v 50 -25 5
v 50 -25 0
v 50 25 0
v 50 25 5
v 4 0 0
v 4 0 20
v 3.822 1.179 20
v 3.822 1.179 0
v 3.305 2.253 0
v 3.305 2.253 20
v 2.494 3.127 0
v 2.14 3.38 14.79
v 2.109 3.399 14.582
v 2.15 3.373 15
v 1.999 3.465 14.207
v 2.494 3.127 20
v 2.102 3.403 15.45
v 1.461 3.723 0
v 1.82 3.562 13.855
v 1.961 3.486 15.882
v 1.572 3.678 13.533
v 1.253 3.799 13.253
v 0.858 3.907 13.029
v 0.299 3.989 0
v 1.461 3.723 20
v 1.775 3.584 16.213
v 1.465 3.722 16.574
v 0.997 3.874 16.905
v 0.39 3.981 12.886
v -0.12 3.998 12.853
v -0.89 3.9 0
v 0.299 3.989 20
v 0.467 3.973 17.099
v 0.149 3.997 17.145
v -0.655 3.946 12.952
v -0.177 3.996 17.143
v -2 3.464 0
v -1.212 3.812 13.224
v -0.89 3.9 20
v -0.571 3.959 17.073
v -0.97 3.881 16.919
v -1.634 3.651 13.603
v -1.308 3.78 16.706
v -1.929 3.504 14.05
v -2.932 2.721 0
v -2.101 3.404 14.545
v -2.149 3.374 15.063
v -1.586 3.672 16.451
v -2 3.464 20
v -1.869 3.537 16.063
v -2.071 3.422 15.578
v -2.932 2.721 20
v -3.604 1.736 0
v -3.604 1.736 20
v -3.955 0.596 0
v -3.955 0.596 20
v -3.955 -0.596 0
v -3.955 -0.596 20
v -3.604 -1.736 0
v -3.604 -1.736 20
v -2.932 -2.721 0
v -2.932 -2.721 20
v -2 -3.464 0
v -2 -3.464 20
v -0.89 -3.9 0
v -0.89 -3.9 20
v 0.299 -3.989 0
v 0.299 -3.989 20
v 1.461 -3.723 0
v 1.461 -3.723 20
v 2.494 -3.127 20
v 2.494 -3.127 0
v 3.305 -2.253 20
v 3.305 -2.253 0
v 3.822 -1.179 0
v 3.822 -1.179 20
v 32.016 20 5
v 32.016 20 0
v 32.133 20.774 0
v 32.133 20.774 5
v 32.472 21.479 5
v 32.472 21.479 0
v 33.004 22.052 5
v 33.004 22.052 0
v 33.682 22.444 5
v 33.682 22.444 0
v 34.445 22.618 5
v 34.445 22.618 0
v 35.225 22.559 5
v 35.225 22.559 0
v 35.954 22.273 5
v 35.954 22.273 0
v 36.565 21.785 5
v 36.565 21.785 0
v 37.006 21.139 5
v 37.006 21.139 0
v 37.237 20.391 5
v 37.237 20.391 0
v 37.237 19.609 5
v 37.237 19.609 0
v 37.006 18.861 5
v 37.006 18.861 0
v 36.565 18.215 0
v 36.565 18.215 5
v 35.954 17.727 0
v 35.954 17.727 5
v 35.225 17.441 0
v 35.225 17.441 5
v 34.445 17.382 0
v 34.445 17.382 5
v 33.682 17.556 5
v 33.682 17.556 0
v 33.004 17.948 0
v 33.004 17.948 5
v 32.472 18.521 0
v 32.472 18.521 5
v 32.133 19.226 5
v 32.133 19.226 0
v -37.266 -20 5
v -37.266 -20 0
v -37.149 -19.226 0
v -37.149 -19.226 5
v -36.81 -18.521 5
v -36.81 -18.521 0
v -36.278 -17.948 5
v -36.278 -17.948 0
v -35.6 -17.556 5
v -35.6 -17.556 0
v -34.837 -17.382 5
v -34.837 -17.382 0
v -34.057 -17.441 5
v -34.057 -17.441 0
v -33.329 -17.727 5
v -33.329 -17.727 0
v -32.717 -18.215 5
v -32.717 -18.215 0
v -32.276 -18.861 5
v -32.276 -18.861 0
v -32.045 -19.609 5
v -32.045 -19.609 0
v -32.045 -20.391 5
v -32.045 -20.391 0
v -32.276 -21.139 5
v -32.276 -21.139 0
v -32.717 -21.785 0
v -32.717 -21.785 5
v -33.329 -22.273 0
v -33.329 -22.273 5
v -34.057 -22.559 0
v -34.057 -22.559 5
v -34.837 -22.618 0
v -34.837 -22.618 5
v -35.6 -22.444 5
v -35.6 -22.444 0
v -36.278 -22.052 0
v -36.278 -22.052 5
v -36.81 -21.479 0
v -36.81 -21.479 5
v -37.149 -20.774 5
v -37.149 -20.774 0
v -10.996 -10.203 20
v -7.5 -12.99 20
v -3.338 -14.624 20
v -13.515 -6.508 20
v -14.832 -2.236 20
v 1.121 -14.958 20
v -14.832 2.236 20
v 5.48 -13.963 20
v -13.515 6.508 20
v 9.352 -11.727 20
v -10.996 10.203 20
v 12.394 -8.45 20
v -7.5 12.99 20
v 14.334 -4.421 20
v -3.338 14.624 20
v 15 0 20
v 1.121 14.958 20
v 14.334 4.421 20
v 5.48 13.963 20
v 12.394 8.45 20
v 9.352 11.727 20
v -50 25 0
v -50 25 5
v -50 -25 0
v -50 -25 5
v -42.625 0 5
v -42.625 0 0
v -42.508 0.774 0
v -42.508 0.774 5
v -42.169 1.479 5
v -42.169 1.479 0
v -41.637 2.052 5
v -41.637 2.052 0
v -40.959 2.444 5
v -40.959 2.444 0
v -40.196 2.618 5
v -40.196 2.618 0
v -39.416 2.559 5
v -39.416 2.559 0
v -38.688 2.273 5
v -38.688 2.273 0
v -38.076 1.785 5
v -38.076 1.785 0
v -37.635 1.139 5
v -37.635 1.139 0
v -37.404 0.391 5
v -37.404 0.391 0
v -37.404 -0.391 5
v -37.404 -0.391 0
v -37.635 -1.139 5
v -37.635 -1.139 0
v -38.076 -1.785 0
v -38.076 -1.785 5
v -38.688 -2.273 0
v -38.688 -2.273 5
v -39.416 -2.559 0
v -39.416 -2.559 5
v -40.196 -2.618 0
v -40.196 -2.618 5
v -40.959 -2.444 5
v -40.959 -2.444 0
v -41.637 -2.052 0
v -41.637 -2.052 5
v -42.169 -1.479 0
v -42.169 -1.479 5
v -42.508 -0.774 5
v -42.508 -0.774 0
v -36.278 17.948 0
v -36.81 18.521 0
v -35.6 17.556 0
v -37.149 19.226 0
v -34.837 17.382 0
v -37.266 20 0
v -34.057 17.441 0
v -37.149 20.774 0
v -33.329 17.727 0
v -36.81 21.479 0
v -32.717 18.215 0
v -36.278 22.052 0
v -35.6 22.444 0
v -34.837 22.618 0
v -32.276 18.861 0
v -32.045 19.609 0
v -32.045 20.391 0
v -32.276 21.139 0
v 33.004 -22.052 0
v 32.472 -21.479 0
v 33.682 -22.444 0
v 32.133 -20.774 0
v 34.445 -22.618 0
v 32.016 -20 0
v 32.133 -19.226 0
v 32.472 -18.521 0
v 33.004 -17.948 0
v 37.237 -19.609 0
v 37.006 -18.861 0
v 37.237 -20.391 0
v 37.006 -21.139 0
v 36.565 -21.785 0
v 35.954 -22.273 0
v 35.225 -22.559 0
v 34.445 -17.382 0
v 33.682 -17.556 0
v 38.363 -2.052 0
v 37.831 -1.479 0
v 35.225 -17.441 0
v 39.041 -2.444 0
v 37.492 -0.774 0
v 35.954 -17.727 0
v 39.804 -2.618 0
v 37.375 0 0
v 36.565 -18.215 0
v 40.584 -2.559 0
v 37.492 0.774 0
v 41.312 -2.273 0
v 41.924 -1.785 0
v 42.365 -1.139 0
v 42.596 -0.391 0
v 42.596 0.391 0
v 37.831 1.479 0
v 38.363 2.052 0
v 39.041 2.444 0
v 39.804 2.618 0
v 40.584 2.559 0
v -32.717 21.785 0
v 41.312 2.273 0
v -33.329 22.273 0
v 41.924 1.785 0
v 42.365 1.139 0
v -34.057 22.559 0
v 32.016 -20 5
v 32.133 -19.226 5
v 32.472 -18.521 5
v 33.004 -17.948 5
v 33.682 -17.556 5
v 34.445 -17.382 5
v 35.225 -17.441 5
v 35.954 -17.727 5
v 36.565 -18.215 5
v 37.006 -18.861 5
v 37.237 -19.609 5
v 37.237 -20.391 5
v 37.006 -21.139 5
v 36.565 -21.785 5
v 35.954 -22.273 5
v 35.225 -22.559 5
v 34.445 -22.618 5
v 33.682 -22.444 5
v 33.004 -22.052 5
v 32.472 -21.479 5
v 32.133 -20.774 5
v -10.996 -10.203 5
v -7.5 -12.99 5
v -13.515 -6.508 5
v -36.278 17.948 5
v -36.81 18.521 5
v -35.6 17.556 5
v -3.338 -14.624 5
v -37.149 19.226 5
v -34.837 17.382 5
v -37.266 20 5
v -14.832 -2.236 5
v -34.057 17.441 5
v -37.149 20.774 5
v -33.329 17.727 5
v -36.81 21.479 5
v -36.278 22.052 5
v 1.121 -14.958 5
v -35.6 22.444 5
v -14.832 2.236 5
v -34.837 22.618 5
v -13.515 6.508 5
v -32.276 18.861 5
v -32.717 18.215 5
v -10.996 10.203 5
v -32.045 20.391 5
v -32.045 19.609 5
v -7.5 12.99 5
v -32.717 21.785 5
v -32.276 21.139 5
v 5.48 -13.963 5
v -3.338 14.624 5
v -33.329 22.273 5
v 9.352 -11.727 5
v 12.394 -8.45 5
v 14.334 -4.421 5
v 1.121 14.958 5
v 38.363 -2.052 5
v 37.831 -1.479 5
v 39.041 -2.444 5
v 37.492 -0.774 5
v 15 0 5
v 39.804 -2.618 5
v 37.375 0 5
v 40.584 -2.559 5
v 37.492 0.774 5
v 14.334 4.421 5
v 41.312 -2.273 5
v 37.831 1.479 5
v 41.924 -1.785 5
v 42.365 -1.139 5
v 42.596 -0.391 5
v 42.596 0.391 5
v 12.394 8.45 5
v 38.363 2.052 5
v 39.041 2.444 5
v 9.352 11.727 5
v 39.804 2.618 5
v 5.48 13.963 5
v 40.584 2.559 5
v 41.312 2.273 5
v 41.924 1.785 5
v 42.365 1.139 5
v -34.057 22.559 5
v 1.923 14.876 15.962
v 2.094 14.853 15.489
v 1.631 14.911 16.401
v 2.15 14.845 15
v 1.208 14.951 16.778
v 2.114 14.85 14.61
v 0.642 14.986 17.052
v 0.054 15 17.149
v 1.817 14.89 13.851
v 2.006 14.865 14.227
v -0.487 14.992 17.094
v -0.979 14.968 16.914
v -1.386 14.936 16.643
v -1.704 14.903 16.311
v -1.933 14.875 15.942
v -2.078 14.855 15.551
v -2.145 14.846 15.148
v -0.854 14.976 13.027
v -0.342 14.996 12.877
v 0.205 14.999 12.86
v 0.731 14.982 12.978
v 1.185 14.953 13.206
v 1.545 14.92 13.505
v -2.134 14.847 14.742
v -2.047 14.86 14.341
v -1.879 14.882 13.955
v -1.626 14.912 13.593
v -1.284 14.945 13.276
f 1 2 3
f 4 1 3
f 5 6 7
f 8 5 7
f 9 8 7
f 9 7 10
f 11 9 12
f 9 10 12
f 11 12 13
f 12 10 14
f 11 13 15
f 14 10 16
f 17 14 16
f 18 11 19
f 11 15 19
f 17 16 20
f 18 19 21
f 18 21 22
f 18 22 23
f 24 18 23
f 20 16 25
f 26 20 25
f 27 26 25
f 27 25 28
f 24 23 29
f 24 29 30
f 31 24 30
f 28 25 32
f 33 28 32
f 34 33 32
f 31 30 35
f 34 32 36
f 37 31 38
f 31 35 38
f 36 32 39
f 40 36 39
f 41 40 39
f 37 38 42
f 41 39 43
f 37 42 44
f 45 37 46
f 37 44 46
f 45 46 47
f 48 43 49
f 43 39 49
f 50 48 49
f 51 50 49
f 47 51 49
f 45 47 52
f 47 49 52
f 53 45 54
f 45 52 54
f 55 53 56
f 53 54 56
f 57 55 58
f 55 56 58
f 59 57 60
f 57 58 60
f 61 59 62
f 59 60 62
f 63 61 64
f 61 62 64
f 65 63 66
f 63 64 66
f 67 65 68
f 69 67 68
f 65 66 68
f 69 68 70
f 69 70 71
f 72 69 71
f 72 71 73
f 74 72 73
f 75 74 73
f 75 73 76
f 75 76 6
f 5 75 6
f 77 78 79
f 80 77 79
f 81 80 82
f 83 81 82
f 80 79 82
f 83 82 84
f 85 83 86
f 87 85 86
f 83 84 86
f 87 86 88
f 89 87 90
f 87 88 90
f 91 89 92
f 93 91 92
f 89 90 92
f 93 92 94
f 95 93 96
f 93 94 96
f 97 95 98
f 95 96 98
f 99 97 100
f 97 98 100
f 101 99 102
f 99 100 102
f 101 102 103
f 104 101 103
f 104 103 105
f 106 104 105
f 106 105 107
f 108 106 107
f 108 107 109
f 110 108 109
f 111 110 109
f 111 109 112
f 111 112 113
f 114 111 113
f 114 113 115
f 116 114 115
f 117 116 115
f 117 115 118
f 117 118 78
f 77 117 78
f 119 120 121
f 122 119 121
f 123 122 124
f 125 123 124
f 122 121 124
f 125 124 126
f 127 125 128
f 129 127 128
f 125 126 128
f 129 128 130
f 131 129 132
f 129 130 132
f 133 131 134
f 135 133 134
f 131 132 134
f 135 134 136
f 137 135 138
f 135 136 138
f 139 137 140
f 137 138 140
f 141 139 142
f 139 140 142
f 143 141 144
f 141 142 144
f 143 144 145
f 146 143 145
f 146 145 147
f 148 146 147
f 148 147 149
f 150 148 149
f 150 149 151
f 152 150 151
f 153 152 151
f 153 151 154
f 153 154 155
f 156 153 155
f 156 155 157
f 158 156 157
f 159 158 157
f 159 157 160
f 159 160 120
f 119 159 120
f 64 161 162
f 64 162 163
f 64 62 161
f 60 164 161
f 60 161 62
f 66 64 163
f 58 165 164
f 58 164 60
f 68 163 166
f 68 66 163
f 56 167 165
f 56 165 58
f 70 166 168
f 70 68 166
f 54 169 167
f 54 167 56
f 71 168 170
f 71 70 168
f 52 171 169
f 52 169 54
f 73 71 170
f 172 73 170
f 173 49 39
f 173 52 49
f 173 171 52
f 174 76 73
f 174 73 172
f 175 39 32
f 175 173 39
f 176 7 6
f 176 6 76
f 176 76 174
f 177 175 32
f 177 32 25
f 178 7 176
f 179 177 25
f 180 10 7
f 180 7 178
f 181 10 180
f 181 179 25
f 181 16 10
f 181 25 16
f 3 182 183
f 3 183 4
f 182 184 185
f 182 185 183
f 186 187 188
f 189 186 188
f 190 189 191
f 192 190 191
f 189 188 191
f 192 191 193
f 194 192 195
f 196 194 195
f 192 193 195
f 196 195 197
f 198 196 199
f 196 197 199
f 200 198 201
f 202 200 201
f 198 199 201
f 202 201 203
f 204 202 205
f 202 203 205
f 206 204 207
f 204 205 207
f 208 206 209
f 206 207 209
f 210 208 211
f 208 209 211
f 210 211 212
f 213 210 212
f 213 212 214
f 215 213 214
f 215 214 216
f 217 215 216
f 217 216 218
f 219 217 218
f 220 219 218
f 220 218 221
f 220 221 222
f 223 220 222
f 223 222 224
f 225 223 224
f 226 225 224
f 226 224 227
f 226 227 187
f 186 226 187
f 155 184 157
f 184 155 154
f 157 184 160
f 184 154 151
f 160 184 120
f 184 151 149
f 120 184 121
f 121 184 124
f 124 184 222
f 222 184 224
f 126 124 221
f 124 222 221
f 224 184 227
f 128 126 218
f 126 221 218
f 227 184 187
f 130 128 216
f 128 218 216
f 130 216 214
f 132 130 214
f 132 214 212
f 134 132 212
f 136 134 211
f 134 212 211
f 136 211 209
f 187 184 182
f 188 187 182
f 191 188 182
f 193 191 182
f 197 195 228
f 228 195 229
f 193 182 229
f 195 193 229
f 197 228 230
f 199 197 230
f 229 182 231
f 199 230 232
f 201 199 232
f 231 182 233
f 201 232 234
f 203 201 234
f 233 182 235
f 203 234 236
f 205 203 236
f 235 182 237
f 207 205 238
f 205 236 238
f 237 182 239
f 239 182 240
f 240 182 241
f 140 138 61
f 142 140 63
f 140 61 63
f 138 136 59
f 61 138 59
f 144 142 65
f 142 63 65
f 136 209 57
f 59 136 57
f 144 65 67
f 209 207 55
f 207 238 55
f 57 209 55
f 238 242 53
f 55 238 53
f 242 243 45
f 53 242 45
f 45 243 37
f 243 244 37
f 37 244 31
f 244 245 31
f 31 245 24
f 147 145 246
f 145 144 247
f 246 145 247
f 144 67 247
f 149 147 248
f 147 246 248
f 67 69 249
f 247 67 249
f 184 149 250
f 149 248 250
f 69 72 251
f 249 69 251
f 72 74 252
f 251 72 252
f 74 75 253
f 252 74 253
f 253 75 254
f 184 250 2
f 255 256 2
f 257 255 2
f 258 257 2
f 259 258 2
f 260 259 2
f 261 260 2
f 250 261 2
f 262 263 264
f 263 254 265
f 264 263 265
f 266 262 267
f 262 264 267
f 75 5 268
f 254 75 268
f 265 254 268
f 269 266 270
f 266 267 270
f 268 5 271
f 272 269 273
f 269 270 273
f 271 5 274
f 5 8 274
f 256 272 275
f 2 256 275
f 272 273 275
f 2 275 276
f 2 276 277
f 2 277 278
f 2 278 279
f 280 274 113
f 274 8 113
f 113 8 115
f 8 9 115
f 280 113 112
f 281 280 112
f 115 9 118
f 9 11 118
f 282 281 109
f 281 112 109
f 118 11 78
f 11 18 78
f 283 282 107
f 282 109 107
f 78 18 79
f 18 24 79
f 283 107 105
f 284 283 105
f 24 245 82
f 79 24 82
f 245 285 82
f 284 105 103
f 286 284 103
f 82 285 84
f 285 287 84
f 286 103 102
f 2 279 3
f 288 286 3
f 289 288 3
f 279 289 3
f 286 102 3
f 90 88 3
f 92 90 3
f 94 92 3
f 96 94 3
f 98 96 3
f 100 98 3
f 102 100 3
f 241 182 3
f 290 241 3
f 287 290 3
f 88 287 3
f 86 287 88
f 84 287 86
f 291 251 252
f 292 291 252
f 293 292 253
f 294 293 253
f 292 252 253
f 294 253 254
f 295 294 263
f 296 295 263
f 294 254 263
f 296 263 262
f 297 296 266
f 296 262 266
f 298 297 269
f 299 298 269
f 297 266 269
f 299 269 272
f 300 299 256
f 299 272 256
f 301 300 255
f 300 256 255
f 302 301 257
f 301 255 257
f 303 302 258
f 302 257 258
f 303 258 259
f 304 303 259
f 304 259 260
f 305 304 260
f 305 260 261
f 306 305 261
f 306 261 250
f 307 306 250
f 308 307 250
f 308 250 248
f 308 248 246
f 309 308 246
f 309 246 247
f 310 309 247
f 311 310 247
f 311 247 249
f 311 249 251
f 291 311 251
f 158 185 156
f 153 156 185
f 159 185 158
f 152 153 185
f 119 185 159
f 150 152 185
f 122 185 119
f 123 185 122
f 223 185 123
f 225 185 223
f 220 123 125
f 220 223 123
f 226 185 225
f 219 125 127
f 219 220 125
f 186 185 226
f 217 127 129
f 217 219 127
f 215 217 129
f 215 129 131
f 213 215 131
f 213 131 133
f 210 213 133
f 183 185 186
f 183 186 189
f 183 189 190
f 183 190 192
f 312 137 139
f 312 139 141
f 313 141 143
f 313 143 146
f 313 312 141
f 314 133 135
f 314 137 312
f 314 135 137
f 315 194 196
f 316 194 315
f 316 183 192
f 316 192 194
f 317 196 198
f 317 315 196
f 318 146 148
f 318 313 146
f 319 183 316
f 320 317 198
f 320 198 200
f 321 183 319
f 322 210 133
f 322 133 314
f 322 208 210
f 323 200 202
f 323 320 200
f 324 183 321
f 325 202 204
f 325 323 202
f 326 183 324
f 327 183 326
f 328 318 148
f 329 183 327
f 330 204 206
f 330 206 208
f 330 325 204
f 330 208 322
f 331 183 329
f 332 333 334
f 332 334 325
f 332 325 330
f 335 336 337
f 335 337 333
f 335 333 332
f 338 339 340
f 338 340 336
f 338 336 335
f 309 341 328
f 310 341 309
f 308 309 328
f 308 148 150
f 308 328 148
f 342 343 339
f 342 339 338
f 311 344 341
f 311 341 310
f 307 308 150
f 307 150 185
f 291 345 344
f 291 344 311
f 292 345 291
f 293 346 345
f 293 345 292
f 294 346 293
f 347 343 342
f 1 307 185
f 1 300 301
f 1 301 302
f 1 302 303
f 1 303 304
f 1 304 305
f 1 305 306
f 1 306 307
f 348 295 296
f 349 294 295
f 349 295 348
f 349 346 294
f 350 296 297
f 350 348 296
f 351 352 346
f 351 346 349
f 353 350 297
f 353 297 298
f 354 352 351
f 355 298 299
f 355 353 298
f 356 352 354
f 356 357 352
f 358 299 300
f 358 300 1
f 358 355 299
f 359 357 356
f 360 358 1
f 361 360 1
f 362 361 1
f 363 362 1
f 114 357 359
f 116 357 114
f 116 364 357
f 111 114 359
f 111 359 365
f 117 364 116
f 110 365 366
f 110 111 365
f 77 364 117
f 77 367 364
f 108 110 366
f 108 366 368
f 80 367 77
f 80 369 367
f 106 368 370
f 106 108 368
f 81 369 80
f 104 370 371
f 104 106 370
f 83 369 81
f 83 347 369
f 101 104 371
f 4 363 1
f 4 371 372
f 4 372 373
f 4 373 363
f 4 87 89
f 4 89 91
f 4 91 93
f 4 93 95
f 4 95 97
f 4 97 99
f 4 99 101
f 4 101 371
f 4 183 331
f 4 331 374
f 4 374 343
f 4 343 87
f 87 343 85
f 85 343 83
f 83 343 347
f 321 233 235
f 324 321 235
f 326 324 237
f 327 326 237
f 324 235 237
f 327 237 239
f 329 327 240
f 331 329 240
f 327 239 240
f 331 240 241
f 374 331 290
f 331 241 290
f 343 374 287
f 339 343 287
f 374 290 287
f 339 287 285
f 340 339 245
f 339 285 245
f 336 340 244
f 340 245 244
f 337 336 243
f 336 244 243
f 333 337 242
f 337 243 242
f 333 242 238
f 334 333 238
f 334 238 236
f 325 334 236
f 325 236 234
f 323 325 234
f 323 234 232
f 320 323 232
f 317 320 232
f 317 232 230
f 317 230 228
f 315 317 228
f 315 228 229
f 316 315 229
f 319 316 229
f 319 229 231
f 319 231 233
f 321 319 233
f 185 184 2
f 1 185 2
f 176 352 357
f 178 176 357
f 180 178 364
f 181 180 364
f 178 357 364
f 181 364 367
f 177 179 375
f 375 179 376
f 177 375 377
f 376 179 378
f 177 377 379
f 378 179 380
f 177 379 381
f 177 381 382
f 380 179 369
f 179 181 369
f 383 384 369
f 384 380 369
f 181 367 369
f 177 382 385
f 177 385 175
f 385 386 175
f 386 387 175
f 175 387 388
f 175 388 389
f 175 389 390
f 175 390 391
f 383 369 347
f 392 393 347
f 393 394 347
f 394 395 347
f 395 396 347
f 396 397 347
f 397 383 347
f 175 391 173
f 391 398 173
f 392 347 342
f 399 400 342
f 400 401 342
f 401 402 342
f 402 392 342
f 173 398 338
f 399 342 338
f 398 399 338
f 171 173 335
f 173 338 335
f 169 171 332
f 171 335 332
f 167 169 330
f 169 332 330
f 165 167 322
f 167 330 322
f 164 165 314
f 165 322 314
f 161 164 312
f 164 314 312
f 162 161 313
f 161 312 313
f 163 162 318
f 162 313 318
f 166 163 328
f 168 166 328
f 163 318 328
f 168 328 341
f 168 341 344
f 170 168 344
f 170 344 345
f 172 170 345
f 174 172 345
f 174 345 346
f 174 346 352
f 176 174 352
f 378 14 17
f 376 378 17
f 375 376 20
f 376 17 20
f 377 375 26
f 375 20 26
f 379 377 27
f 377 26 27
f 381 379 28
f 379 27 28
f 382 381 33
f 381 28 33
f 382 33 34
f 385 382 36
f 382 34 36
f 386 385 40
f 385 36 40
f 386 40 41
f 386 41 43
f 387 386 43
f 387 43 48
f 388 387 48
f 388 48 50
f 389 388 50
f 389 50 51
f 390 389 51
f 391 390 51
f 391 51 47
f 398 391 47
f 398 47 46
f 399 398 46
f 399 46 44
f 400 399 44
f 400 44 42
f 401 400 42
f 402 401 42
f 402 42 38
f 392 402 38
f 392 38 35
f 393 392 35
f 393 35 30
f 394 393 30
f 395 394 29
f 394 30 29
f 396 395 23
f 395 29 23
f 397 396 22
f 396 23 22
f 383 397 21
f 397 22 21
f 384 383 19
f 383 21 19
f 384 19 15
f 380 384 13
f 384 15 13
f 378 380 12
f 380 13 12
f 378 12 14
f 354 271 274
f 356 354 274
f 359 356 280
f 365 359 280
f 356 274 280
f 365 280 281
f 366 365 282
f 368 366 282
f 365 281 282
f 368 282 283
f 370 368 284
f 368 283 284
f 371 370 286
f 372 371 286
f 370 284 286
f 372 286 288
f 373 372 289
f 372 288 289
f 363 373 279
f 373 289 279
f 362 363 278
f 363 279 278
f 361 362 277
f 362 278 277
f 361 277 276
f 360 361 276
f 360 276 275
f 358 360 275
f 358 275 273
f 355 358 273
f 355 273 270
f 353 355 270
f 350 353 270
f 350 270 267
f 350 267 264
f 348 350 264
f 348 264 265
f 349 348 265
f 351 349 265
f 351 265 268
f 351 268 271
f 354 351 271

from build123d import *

# Parameters (mm, degrees)
F0_W     = 100
F0_H     = 50
F1_DEPTH = 5
F2_R     = 15
F3_DEPTH = 15
F4_R     = 4
F5_DEPTH = 20.001
F7_D     = 5.25
F8_R     = 2.15
F9_DEPTH = 25.001


with BuildPart() as f1:
    # F0 (on Top) → F1 (new body)
    with BuildSketch(Plane.XY):
        Rectangle(F0_W, F0_H)
    extrude(amount=F1_DEPTH)

    # F2 (on face) → F3 (join)
    with BuildSketch(Plane.XY.offset(5)):
        Circle(F2_R)
    extrude(amount=F3_DEPTH)

    # F4 (on face) → F5 (cut, through all)
    with BuildSketch(Plane.XY.offset(20)):
        Circle(F4_R)
    extrude(amount=-F5_DEPTH, mode=Mode.SUBTRACT)

    # F7 (through all)
    with Locations(Plane.XY.offset(5)):
        with Locations((-34.6410161514, 20), (-40, 0), (-34.6410161514, -20), (34.6410161514, 20), (40, 0), (34.6410161514, -20)):
            Hole(F7_D / 2)

    # F8 (on Front) → F9 (cut, through all)
    with BuildSketch(Plane.XZ):
        with Locations((0, 15)):
            Circle(F8_R)
    extrude(amount=-F9_DEPTH, mode=Mode.SUBTRACT)


solid = f1.part
